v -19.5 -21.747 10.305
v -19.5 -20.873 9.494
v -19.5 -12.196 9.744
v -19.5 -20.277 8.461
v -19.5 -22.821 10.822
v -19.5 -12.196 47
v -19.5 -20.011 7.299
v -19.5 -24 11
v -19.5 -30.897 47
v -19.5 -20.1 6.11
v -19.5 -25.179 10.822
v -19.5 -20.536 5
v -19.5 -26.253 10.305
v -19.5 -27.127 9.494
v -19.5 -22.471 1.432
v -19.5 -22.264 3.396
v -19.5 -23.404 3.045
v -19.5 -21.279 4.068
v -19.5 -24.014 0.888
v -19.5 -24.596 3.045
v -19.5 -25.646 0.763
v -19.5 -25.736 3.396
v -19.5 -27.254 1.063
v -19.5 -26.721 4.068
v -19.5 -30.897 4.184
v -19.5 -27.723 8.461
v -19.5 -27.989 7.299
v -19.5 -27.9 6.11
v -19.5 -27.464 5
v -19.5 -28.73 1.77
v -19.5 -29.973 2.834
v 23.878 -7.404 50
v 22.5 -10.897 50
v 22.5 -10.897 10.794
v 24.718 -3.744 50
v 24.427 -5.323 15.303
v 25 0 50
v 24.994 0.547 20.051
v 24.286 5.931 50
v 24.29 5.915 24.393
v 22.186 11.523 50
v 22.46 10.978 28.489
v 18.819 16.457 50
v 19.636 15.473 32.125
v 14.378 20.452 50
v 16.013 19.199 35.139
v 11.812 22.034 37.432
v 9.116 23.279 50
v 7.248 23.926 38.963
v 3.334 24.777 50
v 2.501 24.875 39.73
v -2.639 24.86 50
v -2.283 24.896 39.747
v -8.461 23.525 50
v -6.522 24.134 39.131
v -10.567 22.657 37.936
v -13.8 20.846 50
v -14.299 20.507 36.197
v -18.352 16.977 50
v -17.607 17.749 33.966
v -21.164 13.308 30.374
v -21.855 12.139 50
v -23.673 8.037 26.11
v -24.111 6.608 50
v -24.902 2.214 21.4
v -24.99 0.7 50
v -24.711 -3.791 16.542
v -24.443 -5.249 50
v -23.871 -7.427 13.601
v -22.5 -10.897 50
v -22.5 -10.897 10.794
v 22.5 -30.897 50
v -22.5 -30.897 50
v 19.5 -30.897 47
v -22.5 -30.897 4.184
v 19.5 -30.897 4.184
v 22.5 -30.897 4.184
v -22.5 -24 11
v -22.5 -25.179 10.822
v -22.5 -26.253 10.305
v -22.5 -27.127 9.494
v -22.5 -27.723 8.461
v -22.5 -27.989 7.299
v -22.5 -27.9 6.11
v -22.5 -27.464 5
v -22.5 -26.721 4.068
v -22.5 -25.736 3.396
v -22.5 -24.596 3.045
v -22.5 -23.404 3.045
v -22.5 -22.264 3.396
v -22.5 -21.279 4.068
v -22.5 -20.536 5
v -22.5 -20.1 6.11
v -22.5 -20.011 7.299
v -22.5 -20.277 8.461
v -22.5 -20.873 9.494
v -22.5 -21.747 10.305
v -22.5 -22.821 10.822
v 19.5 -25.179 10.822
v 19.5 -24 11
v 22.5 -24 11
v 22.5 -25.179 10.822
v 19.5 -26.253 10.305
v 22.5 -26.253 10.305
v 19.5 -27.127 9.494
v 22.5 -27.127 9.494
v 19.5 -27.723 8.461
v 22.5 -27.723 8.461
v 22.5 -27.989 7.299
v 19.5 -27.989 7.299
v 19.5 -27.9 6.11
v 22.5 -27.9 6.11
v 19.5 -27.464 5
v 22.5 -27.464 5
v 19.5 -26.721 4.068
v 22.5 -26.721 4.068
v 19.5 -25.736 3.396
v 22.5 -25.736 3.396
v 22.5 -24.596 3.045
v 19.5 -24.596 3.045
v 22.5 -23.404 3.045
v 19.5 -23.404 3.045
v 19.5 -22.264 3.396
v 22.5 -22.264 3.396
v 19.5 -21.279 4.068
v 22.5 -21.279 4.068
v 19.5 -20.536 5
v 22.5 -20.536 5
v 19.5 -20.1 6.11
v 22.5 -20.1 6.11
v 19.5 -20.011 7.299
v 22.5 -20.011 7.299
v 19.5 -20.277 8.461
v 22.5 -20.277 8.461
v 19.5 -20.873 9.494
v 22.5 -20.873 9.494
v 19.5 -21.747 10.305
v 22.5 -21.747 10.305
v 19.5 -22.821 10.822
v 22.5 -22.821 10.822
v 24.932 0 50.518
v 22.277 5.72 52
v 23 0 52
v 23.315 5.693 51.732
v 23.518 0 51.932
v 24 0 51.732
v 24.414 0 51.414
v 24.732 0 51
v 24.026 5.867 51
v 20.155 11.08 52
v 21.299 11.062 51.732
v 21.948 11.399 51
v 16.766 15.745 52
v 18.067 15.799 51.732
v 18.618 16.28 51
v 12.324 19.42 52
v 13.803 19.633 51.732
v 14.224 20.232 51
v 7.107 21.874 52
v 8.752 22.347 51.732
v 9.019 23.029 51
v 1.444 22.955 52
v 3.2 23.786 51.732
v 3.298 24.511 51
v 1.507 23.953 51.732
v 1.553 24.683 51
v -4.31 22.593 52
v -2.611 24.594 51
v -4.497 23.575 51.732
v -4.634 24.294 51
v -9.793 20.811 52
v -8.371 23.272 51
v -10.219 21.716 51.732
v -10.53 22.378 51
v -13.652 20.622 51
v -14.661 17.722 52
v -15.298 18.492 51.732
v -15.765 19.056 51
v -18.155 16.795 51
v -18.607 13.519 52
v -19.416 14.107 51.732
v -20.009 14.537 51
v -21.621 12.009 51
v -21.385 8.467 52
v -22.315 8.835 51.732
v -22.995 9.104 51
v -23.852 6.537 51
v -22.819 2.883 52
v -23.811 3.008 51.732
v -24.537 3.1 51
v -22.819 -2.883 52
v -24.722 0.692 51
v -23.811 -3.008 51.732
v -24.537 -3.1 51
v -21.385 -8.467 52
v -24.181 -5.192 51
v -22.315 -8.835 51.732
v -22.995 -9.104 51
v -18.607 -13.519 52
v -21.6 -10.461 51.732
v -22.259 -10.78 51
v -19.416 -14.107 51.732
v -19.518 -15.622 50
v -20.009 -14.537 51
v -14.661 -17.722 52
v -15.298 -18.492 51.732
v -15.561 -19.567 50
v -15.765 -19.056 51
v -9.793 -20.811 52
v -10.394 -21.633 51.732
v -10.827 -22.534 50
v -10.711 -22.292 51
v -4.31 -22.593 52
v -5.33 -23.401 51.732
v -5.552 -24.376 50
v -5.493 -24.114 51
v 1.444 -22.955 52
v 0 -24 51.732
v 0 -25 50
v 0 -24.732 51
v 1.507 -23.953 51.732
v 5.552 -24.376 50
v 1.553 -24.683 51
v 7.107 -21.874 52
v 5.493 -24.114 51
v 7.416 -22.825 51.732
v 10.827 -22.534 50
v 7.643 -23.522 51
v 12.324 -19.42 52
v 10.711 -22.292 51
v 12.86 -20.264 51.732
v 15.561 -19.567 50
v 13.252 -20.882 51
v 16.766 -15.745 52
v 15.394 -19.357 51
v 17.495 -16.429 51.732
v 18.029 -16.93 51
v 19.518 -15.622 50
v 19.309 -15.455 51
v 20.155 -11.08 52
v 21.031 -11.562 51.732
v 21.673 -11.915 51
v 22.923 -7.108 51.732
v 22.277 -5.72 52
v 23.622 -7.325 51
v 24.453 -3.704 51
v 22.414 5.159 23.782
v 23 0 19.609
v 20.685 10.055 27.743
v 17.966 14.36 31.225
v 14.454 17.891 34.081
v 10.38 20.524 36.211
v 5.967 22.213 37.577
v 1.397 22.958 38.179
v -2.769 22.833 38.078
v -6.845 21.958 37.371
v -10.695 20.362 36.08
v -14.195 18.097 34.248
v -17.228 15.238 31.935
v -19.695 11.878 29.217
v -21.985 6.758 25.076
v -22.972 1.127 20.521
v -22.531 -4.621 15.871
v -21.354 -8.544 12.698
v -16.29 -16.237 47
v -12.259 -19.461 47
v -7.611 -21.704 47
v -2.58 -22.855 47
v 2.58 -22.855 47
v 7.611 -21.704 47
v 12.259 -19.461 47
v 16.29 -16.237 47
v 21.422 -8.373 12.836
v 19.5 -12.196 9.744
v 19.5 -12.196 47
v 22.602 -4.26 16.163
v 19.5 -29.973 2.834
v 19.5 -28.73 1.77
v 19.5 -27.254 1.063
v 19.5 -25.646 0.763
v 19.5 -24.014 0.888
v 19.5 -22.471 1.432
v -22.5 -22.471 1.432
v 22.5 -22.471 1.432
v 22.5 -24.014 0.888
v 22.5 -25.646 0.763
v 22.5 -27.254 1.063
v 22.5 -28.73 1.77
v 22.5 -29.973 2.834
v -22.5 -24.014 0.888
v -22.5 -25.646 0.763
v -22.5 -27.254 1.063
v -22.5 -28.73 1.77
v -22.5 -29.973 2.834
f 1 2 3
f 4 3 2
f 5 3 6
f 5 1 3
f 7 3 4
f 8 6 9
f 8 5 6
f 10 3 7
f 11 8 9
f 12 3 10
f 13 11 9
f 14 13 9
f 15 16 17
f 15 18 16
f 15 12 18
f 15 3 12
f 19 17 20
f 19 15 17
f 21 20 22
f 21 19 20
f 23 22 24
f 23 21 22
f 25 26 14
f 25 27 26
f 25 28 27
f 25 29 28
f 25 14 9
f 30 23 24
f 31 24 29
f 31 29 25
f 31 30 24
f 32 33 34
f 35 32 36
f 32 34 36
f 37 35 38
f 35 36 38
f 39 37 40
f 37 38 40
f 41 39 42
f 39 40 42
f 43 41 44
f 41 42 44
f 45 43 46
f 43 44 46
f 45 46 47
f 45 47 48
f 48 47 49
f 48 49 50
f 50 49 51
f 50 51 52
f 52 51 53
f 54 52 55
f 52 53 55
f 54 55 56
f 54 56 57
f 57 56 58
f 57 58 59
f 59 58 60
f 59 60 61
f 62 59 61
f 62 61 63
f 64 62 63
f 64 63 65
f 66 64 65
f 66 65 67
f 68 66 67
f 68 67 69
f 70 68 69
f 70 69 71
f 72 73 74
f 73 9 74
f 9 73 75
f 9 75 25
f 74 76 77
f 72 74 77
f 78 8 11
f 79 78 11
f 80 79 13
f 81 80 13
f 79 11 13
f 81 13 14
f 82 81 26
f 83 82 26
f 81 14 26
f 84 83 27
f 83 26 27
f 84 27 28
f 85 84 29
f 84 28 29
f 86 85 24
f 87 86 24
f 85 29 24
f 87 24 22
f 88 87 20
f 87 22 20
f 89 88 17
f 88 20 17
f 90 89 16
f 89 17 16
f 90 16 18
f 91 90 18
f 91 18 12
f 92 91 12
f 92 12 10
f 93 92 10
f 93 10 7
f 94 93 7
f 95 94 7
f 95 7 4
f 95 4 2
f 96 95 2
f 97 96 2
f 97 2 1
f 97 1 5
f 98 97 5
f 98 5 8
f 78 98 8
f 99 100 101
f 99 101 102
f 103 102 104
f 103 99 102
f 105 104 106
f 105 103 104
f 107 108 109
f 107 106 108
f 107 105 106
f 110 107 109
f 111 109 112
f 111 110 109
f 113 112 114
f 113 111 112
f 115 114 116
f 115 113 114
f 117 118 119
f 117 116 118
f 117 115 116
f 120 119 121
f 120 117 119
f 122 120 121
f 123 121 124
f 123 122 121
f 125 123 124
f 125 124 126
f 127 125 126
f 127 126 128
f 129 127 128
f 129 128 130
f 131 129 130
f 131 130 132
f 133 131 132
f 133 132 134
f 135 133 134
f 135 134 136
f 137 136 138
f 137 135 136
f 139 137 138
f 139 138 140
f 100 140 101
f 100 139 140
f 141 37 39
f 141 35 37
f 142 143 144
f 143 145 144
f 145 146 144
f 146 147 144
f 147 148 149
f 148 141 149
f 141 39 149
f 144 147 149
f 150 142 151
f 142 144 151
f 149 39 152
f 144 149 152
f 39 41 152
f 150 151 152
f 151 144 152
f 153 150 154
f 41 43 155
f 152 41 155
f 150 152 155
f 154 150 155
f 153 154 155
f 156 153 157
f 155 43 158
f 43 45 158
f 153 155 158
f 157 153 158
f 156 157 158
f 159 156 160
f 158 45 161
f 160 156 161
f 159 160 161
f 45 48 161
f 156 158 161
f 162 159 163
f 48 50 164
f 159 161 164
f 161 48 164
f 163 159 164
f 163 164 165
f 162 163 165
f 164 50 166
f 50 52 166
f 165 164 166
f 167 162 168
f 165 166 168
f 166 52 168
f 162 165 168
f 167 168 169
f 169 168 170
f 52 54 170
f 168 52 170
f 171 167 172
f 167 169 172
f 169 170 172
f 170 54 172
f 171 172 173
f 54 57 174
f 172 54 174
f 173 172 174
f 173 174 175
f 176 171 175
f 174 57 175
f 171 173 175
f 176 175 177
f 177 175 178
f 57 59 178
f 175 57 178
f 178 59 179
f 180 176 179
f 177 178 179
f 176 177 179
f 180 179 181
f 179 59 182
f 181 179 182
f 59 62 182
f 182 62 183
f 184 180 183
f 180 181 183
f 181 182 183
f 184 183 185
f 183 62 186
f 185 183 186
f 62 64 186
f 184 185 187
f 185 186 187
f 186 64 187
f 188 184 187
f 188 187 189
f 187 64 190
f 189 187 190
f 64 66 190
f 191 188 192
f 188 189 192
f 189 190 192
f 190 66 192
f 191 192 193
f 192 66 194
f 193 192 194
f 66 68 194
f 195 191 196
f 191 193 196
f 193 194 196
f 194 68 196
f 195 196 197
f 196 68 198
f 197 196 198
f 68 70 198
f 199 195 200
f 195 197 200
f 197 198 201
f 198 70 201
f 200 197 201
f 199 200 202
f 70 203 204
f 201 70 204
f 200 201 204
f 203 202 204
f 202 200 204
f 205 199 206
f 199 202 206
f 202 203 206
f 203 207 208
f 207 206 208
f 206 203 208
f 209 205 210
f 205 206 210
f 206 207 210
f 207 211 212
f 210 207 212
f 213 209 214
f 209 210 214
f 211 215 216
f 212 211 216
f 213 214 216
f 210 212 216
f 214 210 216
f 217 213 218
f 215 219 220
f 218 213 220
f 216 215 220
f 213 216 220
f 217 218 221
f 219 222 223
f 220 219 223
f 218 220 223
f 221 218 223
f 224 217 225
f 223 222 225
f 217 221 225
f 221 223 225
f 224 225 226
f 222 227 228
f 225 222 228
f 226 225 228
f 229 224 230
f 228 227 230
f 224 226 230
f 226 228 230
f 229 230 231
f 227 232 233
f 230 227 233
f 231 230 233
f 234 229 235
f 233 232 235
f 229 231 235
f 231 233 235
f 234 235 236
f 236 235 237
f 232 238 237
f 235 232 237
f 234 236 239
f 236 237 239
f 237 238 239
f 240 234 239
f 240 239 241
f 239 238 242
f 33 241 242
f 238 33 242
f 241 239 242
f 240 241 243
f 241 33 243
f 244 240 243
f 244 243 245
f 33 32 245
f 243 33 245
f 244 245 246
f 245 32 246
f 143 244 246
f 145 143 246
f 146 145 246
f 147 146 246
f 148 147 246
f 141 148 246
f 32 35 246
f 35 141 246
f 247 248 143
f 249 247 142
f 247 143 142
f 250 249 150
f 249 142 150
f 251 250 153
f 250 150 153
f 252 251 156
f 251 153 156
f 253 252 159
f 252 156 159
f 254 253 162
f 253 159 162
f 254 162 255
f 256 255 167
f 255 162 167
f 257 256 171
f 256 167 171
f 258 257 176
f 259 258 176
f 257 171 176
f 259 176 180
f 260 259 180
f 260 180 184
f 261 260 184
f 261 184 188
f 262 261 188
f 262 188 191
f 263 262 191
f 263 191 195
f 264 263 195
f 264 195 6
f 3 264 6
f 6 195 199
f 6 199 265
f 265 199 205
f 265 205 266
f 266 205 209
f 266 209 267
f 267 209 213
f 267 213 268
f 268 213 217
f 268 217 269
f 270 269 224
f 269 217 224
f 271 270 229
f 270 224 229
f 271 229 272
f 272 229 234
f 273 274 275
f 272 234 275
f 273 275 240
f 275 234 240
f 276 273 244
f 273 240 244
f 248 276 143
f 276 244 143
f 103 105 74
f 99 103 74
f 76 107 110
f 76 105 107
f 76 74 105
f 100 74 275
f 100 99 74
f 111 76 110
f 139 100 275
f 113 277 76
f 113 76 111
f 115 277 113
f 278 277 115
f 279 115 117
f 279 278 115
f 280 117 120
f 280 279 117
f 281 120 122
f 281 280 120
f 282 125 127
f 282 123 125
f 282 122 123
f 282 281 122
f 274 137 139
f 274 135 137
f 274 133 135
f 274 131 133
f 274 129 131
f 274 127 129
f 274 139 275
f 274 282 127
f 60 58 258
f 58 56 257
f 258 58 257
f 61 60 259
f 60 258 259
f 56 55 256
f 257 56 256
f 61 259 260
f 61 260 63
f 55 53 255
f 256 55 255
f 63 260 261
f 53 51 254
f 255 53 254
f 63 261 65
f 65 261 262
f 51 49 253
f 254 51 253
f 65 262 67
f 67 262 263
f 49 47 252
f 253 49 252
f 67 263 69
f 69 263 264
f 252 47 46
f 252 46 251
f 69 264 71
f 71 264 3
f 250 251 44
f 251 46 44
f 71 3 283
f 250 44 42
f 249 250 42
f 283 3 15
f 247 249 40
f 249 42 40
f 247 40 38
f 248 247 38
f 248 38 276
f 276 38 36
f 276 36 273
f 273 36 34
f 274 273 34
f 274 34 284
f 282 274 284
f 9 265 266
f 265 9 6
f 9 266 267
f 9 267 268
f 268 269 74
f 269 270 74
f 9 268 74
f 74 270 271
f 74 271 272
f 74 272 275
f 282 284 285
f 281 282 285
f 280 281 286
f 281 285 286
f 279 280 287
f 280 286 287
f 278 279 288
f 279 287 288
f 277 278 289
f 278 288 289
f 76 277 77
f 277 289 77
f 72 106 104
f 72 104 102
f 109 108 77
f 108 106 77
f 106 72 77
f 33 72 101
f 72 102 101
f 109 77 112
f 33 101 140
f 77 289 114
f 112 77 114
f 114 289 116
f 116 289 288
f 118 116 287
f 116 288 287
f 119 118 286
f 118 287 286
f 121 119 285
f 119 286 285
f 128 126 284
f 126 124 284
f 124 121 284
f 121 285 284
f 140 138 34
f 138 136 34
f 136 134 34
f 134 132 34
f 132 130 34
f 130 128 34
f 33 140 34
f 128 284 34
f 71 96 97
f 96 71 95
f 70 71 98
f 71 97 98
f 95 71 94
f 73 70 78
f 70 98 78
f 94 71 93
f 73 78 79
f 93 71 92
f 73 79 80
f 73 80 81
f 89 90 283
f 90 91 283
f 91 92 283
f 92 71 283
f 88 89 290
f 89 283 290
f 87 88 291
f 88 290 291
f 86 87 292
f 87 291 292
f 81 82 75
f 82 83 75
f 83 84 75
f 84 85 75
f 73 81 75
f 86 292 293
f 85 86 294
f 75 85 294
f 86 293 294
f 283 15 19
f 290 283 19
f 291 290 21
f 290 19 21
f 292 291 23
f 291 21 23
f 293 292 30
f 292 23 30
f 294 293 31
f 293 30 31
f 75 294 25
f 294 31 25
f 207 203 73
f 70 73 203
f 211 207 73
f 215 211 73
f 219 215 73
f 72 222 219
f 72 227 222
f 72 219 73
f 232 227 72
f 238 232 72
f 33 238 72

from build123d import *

# Parameters (mm, degrees)
EXTRUDE_1_DEPTH      = 50
SHELL_2_T            = -3
SKETCH_13_R          = 4
CUT_EXTRUDE_1_DEPTH  = 250
SKETCH_18_R          = 25
EXTRUDE_4_DEPTH      = 2
SKETCH_19_R          = 9.153493009
CUT_EXTRUDE_10_DEPTH = 65.852487738
SKETCH_16_R          = 25
EXTRUDE_3_DEPTH      = 2
SKETCH_17_R          = 23
CUT_EXTRUDE_9_DEPTH  = 65.852487738


with BuildPart() as part:
    # 草图1 → 凸台-拉伸1 (new body)
    with BuildSketch(Plane.XY):
        with BuildLine():
            Line((-22.5, -10.897247359), (-22.5, -30.897247359))
            Line((-22.5, -30.897247359), (22.5, -30.897247359))
            Line((22.5, -30.897247359), (22.5, -10.897247359))
            ThreePointArc((22.5, -10.897247359), (0, 25), (-22.5, -10.897247359))
        make_face()
    extrude(amount=EXTRUDE_1_DEPTH)

    # 抽壳2
    shell_2_openings = [part.faces().sort_by_distance(p)[0] for p in [
        (0, -4.655282496, 0),
        (0, -30.897247359, 25),
    ]]
    offset(amount=SHELL_2_T, openings=shell_2_openings, kind=Kind.INTERSECTION)

    # 草图13 → 切除-拉伸1 (cut, symmetric)
    with BuildSketch(Plane(origin=(0, 0, 0), x_dir=(0, 0, -1), z_dir=(1, 0, 0))):
        with Locations(Location((-7, -24, 0), (0, 0, 180))):
            Circle(SKETCH_13_R)
        with BuildLine():
            Line((-40, 25.208572912), (-1.432281326, -22.471249301))
            ThreePointArc((-1.432281326, -22.471249301), (-1.063231061, -27.254219062), (-4.184343468, -30.897247359))
            Line((-4.184343468, -30.897247359), (0, -30.897247359))
            Line((0, -30.897247359), (0, 25.208572912))
            Line((0, 25.208572912), (-40, 25.208572912))
        make_face()
    extrude(amount=CUT_EXTRUDE_1_DEPTH, both=True, mode=Mode.SUBTRACT)

    # 草图18 → 凸台-拉伸4 (add)
    with BuildSketch(Plane.XY.offset(50)):
        with Locations(Location((0, 0, 0), (0, 0, 205.841932763))):
            Circle(SKETCH_18_R)
    extrude(amount=EXTRUDE_4_DEPTH)

    # 圆角3: read off the stored shape, not the designer's step
    # 圆角3 outline → 圆角3 (revolve, cut)
    with BuildSketch(Plane.XZ):
        with BuildLine():
            ThreePointArc((23, 52), (24.414213562, 51.414213562), (25, 50))
            Line((25, 50), (25, 52))
            Line((25, 52), (23, 52))
        make_face()
    revolve(axis=Axis((0, 0, 0), (0, 0, 1)), mode=Mode.SUBTRACT)

    # 草图19 → 切除-拉伸10 (cut, through all)
    with BuildSketch(Plane.XY.offset(52)):
        Circle(SKETCH_19_R)
    extrude(amount=-CUT_EXTRUDE_10_DEPTH, mode=Mode.SUBTRACT)

    # 草图16 → 凸台-拉伸3 (add)
    with BuildSketch(Plane.XY.offset(50)):
        with Locations(Location((0, 0, 0), (0, 0, 205.841932763))):
            Circle(SKETCH_16_R)
    extrude(amount=EXTRUDE_3_DEPTH)

    # 圆角2: read off the stored shape, not the designer's step
    # 圆角2 outline → 圆角2 (revolve, cut)
    with BuildSketch(Plane.XZ):
        with BuildLine():
            ThreePointArc((23, 52), (24.414213562, 51.414213562), (25, 50))
            Line((25, 50), (25, 52))
            Line((25, 52), (23, 52))
        make_face()
    revolve(axis=Axis((0, 0, 0), (0, 0, 1)), mode=Mode.SUBTRACT)

    # 草图17 → 切除-拉伸9 (cut, through all)
    with BuildSketch(Plane.XY.offset(52)):
        Circle(SKETCH_17_R)
    extrude(amount=-CUT_EXTRUDE_9_DEPTH, mode=Mode.SUBTRACT)


solid = part.part
